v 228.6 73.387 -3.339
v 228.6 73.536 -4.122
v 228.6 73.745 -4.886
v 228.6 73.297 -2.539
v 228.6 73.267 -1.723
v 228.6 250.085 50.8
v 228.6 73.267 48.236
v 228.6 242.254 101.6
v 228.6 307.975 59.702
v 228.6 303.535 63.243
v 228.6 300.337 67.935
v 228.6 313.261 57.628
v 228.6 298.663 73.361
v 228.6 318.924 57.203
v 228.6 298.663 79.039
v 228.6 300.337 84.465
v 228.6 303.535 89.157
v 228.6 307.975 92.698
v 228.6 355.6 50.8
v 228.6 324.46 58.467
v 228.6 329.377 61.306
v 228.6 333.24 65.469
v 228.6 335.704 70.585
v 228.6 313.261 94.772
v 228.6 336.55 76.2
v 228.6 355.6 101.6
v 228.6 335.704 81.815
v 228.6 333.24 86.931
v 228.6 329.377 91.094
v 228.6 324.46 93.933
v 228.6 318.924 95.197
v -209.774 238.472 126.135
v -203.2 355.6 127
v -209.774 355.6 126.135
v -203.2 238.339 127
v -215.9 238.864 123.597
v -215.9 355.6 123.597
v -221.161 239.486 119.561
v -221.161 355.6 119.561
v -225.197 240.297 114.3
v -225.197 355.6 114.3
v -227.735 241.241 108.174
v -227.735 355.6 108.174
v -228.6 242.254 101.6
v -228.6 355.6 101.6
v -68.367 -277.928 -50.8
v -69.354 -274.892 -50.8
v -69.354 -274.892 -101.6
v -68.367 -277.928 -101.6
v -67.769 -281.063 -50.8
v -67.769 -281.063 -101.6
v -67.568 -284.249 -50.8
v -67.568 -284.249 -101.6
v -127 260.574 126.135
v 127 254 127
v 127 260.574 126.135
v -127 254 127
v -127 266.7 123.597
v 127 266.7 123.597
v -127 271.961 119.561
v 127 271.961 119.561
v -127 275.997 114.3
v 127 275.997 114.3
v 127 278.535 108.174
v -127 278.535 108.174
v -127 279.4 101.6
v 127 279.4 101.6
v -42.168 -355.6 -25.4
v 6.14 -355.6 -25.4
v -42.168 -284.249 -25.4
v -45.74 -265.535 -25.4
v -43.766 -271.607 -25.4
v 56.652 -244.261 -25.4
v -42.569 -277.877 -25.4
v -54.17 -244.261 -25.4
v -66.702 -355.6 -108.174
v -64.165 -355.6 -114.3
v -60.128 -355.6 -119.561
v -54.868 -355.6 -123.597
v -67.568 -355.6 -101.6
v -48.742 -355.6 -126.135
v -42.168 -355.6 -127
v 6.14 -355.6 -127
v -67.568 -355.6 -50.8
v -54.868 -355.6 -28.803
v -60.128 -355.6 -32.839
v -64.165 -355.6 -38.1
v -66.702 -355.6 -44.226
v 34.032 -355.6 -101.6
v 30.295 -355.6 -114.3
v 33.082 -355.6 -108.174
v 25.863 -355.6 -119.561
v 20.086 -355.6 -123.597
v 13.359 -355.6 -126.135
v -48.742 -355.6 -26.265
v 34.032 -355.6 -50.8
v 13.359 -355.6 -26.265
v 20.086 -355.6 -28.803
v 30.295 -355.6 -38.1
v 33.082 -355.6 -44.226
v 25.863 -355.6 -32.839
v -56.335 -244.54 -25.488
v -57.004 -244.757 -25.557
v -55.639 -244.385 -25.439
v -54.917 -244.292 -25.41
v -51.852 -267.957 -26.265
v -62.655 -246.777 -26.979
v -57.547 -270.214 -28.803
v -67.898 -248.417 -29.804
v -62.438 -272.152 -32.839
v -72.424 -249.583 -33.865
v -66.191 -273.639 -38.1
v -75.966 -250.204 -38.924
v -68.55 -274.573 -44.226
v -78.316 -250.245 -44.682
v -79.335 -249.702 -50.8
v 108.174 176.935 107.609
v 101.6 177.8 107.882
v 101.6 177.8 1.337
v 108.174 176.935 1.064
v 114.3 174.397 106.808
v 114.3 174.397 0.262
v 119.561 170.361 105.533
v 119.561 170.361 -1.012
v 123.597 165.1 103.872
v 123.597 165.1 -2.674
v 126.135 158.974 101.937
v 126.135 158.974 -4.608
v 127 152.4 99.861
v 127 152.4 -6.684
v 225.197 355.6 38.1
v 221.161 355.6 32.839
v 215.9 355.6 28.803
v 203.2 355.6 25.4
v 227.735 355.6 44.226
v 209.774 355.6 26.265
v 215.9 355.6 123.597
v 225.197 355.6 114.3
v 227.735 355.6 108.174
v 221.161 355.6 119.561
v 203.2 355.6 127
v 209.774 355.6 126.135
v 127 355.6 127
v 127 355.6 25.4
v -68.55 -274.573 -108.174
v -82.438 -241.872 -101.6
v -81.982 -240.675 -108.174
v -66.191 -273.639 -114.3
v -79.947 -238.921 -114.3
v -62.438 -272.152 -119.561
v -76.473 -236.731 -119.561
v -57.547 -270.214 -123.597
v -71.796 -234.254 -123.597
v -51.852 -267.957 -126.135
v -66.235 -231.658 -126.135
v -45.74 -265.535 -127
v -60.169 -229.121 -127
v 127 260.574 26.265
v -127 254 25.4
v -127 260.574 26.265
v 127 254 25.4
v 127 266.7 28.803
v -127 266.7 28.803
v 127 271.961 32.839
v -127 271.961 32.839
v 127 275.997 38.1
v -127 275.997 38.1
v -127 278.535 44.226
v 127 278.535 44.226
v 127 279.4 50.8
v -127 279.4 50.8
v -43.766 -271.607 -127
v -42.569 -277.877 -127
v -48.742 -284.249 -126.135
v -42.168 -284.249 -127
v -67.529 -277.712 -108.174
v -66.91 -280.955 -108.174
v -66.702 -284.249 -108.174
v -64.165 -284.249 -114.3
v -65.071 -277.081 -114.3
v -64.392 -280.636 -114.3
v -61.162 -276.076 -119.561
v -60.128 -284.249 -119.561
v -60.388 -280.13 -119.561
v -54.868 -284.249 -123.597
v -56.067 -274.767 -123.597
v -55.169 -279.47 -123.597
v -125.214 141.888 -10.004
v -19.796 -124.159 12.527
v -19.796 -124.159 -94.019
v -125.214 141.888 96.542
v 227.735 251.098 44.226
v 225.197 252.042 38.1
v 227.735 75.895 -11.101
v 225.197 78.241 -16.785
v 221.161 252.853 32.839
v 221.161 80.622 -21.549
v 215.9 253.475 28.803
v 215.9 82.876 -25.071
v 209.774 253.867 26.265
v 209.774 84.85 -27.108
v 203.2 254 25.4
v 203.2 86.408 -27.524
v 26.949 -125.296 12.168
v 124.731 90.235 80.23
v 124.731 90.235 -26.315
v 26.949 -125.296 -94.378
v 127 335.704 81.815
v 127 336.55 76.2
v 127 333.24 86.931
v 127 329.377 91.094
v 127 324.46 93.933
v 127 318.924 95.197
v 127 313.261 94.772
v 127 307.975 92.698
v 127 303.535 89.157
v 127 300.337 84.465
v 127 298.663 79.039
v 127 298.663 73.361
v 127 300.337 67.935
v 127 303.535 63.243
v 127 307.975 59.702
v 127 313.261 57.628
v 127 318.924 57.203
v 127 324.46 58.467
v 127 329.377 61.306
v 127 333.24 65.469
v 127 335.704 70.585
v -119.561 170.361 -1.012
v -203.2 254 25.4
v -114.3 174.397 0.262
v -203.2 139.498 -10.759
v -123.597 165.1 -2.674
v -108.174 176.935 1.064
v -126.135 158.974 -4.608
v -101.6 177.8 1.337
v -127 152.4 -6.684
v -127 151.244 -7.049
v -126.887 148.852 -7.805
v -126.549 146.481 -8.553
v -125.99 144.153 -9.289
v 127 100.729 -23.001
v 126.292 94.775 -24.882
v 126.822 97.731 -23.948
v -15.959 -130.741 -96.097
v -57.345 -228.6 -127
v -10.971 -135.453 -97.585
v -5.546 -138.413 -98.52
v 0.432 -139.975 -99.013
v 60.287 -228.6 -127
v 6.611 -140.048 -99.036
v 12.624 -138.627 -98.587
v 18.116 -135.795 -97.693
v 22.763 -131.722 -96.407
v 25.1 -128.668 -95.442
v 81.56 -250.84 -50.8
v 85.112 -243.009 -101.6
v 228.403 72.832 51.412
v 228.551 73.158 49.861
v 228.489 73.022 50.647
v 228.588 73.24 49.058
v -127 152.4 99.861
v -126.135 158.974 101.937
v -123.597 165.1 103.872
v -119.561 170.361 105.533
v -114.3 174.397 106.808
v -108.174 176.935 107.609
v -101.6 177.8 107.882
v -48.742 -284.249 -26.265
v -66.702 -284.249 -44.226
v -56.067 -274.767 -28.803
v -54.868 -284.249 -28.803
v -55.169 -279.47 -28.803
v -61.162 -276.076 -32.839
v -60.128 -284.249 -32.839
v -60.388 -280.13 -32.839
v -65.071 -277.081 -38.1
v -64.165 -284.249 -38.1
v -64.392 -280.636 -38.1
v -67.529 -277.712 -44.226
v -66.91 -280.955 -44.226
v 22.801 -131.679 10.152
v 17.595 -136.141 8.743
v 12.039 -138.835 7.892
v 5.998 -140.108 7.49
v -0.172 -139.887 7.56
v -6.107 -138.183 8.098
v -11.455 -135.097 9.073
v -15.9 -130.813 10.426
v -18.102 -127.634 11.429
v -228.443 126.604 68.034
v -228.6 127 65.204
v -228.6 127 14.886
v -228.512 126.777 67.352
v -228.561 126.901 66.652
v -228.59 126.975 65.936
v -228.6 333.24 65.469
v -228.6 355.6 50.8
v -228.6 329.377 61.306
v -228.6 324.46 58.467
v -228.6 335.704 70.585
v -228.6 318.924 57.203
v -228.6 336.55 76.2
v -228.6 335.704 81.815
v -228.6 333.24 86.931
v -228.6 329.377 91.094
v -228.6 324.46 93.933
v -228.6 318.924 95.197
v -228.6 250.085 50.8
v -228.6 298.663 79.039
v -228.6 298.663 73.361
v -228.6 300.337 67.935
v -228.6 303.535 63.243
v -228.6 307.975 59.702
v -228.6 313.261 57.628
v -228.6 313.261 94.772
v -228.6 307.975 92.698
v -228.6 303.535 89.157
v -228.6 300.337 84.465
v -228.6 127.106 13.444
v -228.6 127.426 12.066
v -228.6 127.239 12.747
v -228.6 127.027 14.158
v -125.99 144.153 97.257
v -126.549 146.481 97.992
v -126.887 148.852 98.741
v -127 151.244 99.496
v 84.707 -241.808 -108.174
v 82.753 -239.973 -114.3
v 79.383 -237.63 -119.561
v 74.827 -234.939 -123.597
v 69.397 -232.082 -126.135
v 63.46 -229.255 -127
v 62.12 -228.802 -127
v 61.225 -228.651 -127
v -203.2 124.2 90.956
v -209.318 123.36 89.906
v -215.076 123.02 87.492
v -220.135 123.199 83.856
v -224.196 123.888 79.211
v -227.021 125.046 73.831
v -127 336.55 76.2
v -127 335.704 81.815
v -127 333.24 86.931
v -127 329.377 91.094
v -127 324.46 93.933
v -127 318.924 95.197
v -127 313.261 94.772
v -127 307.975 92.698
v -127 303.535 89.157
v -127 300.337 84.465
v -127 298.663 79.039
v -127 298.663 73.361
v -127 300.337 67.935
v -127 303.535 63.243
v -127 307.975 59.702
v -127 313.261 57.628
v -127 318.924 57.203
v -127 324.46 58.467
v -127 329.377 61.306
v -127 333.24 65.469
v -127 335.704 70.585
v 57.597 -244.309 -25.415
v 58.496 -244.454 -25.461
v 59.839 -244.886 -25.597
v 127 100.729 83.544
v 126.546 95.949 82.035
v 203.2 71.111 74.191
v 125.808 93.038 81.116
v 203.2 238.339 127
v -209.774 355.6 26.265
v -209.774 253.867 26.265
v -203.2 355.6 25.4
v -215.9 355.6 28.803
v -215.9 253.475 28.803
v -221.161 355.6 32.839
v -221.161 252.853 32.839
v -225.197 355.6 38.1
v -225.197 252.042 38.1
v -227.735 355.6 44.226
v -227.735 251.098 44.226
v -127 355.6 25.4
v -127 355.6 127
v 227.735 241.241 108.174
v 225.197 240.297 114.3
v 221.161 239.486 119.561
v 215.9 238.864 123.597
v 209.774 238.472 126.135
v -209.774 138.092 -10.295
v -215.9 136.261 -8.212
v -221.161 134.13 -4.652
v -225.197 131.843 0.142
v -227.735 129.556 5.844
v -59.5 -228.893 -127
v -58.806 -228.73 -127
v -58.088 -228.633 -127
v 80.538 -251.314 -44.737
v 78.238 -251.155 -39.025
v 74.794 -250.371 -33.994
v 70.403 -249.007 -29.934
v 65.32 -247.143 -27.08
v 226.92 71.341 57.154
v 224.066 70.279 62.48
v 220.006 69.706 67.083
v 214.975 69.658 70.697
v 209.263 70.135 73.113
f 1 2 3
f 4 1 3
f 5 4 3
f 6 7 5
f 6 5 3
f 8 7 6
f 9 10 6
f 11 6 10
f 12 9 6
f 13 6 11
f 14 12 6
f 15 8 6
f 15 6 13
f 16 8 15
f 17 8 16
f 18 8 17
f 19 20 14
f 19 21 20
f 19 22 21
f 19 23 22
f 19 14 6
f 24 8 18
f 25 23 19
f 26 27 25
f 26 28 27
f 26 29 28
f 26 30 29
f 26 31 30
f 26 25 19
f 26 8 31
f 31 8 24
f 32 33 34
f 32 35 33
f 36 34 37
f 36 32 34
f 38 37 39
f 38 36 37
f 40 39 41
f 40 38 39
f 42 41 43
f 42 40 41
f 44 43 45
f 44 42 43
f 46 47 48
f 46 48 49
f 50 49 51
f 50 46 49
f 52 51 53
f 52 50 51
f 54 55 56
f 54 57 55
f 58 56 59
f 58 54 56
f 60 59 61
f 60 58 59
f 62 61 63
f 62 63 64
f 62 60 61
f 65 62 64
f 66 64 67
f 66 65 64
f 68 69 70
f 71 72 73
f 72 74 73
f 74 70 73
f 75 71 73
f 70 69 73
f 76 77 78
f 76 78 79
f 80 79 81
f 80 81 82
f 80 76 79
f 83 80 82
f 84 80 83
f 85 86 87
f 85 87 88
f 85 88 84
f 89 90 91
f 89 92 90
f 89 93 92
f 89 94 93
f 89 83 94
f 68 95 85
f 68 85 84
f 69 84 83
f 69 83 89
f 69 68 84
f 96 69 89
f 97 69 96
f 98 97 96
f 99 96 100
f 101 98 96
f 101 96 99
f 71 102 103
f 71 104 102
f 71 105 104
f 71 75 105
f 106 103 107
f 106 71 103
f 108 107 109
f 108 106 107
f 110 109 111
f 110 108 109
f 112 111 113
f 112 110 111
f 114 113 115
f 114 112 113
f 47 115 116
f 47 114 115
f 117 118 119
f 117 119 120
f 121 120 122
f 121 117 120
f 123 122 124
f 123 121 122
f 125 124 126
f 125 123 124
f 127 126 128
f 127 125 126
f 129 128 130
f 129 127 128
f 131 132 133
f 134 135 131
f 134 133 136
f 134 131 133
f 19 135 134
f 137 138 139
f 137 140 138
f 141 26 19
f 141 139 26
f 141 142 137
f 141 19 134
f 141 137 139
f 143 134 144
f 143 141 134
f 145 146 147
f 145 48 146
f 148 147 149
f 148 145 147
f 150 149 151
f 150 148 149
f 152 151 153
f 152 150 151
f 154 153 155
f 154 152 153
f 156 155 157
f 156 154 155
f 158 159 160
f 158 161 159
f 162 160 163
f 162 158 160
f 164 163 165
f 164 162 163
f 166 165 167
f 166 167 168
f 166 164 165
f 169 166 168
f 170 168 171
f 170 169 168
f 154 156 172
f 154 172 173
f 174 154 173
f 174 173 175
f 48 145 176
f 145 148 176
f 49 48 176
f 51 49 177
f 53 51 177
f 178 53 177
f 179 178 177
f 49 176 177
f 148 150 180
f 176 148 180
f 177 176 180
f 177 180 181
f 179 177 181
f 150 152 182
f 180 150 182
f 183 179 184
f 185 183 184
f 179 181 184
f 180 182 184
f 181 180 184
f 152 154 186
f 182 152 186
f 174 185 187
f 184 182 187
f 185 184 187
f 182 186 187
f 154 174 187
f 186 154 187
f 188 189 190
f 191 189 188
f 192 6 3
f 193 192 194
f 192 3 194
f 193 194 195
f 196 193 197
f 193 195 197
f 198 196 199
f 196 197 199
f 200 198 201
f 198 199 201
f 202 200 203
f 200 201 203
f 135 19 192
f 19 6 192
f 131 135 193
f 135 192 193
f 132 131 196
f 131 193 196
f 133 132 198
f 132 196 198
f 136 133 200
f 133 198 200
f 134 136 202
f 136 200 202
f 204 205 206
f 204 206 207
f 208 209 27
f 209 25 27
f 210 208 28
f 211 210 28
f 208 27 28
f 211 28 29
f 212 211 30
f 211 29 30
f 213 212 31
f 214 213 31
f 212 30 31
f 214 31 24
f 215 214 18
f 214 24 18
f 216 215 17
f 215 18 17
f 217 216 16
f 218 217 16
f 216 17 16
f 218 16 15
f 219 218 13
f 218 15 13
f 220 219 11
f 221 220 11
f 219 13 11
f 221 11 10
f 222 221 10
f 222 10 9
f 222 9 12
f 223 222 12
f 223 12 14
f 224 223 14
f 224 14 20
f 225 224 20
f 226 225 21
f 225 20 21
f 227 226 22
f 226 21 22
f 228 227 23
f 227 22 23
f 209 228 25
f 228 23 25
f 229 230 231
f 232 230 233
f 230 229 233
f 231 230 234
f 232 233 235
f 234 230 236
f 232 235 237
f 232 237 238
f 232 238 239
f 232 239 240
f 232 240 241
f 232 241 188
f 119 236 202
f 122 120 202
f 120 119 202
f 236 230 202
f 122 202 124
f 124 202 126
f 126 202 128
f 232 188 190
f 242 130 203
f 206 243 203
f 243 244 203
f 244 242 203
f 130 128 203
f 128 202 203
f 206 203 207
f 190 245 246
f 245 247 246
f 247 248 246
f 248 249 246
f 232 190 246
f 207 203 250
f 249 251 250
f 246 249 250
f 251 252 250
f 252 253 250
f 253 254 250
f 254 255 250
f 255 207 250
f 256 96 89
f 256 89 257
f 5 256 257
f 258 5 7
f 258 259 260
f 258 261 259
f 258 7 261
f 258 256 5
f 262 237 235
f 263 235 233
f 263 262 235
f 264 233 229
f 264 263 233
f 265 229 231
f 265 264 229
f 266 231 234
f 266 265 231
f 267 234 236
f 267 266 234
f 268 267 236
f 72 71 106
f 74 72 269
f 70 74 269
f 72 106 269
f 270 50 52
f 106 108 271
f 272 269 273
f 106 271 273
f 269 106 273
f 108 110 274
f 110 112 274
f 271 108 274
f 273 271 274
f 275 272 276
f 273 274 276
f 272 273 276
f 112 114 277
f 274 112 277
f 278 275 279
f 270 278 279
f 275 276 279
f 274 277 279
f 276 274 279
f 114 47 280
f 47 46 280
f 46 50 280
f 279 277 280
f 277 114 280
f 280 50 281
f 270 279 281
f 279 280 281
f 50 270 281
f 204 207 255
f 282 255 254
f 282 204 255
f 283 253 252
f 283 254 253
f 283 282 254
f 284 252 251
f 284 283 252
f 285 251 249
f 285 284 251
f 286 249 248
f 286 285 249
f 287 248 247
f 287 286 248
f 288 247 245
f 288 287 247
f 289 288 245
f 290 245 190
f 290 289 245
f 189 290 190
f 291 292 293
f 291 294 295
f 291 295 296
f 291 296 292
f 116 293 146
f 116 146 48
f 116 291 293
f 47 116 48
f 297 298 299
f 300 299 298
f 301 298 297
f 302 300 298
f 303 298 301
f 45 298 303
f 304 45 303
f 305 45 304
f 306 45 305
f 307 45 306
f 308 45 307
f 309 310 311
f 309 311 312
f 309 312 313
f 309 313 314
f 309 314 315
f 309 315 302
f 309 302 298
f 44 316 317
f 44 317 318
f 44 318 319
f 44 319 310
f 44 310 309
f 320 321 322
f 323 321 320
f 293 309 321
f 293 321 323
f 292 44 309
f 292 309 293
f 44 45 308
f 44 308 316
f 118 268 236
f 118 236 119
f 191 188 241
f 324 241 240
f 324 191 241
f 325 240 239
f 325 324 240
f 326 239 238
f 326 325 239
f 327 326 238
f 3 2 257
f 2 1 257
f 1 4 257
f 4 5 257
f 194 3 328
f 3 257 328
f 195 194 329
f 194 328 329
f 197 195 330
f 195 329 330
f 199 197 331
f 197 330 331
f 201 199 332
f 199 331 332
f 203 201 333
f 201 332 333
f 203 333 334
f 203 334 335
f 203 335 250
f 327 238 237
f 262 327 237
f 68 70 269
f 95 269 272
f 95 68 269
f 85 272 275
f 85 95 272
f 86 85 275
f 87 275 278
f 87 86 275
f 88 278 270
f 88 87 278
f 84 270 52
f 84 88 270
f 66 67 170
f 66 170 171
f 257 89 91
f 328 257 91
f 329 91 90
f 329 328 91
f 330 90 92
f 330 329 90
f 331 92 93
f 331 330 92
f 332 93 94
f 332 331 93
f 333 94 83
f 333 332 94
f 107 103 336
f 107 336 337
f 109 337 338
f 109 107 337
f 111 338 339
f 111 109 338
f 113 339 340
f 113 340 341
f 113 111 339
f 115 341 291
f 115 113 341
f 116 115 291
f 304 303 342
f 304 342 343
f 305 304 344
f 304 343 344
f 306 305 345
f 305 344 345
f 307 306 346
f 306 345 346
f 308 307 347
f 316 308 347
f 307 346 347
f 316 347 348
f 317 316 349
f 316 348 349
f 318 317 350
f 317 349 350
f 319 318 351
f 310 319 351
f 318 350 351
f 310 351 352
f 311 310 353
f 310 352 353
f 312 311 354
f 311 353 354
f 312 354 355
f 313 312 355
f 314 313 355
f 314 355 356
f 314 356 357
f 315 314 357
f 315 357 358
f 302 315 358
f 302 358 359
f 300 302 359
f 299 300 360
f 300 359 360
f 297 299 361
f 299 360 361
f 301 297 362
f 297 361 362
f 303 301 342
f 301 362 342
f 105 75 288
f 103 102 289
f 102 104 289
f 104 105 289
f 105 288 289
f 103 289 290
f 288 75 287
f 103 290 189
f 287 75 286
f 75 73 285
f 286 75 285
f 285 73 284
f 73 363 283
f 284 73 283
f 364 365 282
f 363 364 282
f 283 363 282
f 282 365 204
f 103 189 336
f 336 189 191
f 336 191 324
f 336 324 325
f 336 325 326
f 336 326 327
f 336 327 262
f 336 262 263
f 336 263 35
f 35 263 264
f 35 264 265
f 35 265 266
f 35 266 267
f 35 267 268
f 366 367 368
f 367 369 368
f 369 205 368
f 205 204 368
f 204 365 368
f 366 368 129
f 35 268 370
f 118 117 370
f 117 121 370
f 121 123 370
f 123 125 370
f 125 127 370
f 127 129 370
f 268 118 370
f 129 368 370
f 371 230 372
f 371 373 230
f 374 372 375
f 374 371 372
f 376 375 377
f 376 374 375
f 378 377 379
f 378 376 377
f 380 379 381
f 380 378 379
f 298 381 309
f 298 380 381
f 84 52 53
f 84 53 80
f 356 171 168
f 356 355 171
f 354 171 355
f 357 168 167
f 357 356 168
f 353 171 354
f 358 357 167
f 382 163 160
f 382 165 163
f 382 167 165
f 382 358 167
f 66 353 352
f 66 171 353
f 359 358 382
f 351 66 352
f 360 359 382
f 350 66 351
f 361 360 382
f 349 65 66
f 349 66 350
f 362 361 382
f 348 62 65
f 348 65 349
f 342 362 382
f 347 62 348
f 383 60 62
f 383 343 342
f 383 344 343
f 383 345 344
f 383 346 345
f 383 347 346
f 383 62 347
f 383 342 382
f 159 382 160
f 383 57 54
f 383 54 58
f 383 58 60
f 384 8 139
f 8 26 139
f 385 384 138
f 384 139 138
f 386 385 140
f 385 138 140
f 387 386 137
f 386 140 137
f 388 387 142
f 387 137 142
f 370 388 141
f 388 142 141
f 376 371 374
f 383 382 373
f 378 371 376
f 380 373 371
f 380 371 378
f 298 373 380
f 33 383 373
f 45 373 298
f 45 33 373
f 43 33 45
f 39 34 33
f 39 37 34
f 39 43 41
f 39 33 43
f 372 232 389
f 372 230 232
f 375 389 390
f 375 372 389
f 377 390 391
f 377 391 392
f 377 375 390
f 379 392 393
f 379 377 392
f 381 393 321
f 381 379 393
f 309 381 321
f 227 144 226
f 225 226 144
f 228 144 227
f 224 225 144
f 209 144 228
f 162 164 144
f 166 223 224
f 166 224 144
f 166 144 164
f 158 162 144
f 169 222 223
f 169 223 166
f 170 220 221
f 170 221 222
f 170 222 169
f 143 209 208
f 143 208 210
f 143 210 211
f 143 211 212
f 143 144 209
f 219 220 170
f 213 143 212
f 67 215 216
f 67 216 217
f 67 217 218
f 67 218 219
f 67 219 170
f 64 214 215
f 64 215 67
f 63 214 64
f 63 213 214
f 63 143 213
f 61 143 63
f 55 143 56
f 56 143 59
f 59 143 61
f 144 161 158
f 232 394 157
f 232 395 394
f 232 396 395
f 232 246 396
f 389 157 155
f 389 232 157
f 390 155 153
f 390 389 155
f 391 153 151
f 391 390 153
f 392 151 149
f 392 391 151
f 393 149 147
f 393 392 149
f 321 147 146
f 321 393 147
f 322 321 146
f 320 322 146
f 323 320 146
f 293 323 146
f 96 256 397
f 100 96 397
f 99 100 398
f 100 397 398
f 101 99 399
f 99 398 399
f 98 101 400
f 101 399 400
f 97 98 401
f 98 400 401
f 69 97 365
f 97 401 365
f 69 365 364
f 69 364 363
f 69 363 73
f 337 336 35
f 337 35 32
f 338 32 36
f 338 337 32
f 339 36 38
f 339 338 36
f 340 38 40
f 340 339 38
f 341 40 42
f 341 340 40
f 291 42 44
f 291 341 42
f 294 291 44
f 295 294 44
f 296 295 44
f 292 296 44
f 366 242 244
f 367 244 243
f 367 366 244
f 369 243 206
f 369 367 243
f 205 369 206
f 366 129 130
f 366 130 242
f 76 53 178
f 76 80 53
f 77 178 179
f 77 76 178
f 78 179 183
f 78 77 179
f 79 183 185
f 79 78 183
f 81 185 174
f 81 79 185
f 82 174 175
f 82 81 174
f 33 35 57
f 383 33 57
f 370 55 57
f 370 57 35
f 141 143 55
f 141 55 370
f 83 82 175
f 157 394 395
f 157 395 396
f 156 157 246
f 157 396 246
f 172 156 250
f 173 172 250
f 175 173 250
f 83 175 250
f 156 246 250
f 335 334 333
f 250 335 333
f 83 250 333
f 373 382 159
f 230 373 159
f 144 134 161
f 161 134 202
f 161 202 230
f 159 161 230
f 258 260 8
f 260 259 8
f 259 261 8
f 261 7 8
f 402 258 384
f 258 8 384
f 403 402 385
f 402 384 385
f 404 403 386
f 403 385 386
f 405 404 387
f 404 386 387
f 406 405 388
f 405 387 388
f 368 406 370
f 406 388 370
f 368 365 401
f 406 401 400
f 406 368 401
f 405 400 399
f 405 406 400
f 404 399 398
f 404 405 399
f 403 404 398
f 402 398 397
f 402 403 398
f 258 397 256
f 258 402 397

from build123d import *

# Parameters (mm, degrees)
F1_DEPTH = 127
F3_DEPTH = 627.38
F5_DEPTH = 546.1
F6_R     = 19.05
F7_DEPTH = 409.956
F8_R     = 25.39999


# Not quite as in the source:
# - a fillet or chamfer is up to 0.001 mm smaller than in the source, because OpenCascade refuses the exact size


with BuildPart() as f1:
    # F0 (on Top) → F1 (new body, symmetric)
    with BuildSketch(Plane.XY):
        with BuildLine():
            Line((228.6, 73.2671543956), (228.6, 355.6))
            Line((228.6, 355.6), (127, 355.6))
            Line((127, 355.6), (127, 279.4))
            Line((127, 279.4), (-127, 279.4))
            Line((-127, 279.4), (-127, 355.6))
            Line((-127, 355.6), (-228.6, 355.6))
            Line((-228.6, 355.6), (-228.6, 127))
            Line((-228.6, 127), (-69.3541612572, -274.8921242948))
            ThreePointArc((-69.3541612572, -274.8921242948), (-68.0185057912, -279.4860093319), (-67.5679594278, -284.2488617581))
            Line((-67.5679594278, -284.2488617581), (-67.5679594278, -355.6))
            Line((-67.5679594278, -355.6), (34.0320405722, -355.6))
            Line((34.0320405722, -355.6), (228.6, 73.2671543956))
        make_face()
        with BuildLine():
            Line((126.9999997139, 152.3999997139), (126.9999997139, 100.7287641896))
            ThreePointArc((126.9999997139, 100.7287641896), (126.4262326875, 95.3605096932), (124.7308535455, 90.2347849149))
            Line((124.7308535455, 90.2347849149), (26.9491079367, -125.2959690409))
            ThreePointArc((26.9491079367, -125.2959690409), (3.2004851004, -140.194476085), (-19.7955440656, -124.1587272294))
            Line((-19.7955440656, -124.1587272294), (-125.2137978845, 141.8875713817))
            ThreePointArc((-125.2137978845, 141.8875713817), (-126.5494533505, 146.4814564188), (-126.9999997139, 151.244308845))
            Line((-126.9999997139, 151.244308845), (-126.9999997139, 152.3999997139))
            ThreePointArc((-126.9999997139, 152.3999997139), (-119.560511956, 170.360511956), (-101.5999997139, 177.7999997139))
            Line((-101.5999997139, 177.7999997139), (101.5999997139, 177.7999997139))
            ThreePointArc((101.5999997139, 177.7999997139), (119.560511956, 170.360511956), (126.9999997139, 152.3999997139))
        make_face(mode=Mode.SUBTRACT)
    extrude(amount=F1_DEPTH, both=True)

    # F2 (on face) → F3 (cut)
    with BuildSketch(Plane.YZ.offset(228.6)):
        Polygon((-228.6, -127), (-355.6, -127), (-355.6, -25.4), (-399.7474312782, -25.4), (-399.7474312782, -182.4822723866), (403.1273424625, -182.4822723866), (403.1273424625, 126.7705559731), (355.6, 127), (355.6, 25.4), (254, 25.4), align=None)
    extrude(amount=-F3_DEPTH, mode=Mode.SUBTRACT)

    # F4 (on face) → F5 (cut)
    with BuildSketch(Plane.YZ.offset(228.6)):
        Polygon((238.3390568884, 127), (355.6, 127), (355.6, 150.2672582865), (-388.3270025253, 150.2672582865), (-355.6, -25.4), (-244.2609431116, -25.4), (42.6722074132, 65.2104685868), align=None)
    extrude(amount=-F5_DEPTH, mode=Mode.SUBTRACT)

    # F6 (on face) → F7 (cut, symmetric)
    with BuildSketch(Plane.YZ.offset(-127)):
        with Locations((317.5, 76.2)):
            Circle(F6_R)
    extrude(amount=F7_DEPTH, both=True, mode=Mode.SUBTRACT)

    # F8 (radius 25.4 in the source; OpenCascade refuses exactly that, so slightly less here)
    f8_edges = [f1.edges().sort_by_distance(p)[0] for p in [
        (156.572108, -85.496894, 24.736015),
        (228.6, 155.803106, 100.936015),
        (228.6, 296.969528, 127),
        (59.288128, -299.930472, -25.4),
        (-67.567959, -319.924431, -25.4),
        (-155.045734, -58.630472, 33.220149),
        (-228.6, 182.669528, 109.420149),
        (-228.6, 296.969528, 127),
        (-228.6, 304.8, 25.4),
        (-228.6, 190.5, 5.347368),
        (-158.148482, -50.8, -70.852632),
        (-78.525563, -251.746062, -127),
        (-67.567959, -319.924431, -127),
        (160.124628, -77.666423, -79.336765),
        (62.840648, -292.1, -127),
        (228.6, 163.633577, -3.136765),
        (228.6, 304.8, 25.4),
        (0, 279.4, 127),
        (0, 279.4, 25.4),
    ]]
    fillet(f8_edges, radius=F8_R)


solid = f1.part
